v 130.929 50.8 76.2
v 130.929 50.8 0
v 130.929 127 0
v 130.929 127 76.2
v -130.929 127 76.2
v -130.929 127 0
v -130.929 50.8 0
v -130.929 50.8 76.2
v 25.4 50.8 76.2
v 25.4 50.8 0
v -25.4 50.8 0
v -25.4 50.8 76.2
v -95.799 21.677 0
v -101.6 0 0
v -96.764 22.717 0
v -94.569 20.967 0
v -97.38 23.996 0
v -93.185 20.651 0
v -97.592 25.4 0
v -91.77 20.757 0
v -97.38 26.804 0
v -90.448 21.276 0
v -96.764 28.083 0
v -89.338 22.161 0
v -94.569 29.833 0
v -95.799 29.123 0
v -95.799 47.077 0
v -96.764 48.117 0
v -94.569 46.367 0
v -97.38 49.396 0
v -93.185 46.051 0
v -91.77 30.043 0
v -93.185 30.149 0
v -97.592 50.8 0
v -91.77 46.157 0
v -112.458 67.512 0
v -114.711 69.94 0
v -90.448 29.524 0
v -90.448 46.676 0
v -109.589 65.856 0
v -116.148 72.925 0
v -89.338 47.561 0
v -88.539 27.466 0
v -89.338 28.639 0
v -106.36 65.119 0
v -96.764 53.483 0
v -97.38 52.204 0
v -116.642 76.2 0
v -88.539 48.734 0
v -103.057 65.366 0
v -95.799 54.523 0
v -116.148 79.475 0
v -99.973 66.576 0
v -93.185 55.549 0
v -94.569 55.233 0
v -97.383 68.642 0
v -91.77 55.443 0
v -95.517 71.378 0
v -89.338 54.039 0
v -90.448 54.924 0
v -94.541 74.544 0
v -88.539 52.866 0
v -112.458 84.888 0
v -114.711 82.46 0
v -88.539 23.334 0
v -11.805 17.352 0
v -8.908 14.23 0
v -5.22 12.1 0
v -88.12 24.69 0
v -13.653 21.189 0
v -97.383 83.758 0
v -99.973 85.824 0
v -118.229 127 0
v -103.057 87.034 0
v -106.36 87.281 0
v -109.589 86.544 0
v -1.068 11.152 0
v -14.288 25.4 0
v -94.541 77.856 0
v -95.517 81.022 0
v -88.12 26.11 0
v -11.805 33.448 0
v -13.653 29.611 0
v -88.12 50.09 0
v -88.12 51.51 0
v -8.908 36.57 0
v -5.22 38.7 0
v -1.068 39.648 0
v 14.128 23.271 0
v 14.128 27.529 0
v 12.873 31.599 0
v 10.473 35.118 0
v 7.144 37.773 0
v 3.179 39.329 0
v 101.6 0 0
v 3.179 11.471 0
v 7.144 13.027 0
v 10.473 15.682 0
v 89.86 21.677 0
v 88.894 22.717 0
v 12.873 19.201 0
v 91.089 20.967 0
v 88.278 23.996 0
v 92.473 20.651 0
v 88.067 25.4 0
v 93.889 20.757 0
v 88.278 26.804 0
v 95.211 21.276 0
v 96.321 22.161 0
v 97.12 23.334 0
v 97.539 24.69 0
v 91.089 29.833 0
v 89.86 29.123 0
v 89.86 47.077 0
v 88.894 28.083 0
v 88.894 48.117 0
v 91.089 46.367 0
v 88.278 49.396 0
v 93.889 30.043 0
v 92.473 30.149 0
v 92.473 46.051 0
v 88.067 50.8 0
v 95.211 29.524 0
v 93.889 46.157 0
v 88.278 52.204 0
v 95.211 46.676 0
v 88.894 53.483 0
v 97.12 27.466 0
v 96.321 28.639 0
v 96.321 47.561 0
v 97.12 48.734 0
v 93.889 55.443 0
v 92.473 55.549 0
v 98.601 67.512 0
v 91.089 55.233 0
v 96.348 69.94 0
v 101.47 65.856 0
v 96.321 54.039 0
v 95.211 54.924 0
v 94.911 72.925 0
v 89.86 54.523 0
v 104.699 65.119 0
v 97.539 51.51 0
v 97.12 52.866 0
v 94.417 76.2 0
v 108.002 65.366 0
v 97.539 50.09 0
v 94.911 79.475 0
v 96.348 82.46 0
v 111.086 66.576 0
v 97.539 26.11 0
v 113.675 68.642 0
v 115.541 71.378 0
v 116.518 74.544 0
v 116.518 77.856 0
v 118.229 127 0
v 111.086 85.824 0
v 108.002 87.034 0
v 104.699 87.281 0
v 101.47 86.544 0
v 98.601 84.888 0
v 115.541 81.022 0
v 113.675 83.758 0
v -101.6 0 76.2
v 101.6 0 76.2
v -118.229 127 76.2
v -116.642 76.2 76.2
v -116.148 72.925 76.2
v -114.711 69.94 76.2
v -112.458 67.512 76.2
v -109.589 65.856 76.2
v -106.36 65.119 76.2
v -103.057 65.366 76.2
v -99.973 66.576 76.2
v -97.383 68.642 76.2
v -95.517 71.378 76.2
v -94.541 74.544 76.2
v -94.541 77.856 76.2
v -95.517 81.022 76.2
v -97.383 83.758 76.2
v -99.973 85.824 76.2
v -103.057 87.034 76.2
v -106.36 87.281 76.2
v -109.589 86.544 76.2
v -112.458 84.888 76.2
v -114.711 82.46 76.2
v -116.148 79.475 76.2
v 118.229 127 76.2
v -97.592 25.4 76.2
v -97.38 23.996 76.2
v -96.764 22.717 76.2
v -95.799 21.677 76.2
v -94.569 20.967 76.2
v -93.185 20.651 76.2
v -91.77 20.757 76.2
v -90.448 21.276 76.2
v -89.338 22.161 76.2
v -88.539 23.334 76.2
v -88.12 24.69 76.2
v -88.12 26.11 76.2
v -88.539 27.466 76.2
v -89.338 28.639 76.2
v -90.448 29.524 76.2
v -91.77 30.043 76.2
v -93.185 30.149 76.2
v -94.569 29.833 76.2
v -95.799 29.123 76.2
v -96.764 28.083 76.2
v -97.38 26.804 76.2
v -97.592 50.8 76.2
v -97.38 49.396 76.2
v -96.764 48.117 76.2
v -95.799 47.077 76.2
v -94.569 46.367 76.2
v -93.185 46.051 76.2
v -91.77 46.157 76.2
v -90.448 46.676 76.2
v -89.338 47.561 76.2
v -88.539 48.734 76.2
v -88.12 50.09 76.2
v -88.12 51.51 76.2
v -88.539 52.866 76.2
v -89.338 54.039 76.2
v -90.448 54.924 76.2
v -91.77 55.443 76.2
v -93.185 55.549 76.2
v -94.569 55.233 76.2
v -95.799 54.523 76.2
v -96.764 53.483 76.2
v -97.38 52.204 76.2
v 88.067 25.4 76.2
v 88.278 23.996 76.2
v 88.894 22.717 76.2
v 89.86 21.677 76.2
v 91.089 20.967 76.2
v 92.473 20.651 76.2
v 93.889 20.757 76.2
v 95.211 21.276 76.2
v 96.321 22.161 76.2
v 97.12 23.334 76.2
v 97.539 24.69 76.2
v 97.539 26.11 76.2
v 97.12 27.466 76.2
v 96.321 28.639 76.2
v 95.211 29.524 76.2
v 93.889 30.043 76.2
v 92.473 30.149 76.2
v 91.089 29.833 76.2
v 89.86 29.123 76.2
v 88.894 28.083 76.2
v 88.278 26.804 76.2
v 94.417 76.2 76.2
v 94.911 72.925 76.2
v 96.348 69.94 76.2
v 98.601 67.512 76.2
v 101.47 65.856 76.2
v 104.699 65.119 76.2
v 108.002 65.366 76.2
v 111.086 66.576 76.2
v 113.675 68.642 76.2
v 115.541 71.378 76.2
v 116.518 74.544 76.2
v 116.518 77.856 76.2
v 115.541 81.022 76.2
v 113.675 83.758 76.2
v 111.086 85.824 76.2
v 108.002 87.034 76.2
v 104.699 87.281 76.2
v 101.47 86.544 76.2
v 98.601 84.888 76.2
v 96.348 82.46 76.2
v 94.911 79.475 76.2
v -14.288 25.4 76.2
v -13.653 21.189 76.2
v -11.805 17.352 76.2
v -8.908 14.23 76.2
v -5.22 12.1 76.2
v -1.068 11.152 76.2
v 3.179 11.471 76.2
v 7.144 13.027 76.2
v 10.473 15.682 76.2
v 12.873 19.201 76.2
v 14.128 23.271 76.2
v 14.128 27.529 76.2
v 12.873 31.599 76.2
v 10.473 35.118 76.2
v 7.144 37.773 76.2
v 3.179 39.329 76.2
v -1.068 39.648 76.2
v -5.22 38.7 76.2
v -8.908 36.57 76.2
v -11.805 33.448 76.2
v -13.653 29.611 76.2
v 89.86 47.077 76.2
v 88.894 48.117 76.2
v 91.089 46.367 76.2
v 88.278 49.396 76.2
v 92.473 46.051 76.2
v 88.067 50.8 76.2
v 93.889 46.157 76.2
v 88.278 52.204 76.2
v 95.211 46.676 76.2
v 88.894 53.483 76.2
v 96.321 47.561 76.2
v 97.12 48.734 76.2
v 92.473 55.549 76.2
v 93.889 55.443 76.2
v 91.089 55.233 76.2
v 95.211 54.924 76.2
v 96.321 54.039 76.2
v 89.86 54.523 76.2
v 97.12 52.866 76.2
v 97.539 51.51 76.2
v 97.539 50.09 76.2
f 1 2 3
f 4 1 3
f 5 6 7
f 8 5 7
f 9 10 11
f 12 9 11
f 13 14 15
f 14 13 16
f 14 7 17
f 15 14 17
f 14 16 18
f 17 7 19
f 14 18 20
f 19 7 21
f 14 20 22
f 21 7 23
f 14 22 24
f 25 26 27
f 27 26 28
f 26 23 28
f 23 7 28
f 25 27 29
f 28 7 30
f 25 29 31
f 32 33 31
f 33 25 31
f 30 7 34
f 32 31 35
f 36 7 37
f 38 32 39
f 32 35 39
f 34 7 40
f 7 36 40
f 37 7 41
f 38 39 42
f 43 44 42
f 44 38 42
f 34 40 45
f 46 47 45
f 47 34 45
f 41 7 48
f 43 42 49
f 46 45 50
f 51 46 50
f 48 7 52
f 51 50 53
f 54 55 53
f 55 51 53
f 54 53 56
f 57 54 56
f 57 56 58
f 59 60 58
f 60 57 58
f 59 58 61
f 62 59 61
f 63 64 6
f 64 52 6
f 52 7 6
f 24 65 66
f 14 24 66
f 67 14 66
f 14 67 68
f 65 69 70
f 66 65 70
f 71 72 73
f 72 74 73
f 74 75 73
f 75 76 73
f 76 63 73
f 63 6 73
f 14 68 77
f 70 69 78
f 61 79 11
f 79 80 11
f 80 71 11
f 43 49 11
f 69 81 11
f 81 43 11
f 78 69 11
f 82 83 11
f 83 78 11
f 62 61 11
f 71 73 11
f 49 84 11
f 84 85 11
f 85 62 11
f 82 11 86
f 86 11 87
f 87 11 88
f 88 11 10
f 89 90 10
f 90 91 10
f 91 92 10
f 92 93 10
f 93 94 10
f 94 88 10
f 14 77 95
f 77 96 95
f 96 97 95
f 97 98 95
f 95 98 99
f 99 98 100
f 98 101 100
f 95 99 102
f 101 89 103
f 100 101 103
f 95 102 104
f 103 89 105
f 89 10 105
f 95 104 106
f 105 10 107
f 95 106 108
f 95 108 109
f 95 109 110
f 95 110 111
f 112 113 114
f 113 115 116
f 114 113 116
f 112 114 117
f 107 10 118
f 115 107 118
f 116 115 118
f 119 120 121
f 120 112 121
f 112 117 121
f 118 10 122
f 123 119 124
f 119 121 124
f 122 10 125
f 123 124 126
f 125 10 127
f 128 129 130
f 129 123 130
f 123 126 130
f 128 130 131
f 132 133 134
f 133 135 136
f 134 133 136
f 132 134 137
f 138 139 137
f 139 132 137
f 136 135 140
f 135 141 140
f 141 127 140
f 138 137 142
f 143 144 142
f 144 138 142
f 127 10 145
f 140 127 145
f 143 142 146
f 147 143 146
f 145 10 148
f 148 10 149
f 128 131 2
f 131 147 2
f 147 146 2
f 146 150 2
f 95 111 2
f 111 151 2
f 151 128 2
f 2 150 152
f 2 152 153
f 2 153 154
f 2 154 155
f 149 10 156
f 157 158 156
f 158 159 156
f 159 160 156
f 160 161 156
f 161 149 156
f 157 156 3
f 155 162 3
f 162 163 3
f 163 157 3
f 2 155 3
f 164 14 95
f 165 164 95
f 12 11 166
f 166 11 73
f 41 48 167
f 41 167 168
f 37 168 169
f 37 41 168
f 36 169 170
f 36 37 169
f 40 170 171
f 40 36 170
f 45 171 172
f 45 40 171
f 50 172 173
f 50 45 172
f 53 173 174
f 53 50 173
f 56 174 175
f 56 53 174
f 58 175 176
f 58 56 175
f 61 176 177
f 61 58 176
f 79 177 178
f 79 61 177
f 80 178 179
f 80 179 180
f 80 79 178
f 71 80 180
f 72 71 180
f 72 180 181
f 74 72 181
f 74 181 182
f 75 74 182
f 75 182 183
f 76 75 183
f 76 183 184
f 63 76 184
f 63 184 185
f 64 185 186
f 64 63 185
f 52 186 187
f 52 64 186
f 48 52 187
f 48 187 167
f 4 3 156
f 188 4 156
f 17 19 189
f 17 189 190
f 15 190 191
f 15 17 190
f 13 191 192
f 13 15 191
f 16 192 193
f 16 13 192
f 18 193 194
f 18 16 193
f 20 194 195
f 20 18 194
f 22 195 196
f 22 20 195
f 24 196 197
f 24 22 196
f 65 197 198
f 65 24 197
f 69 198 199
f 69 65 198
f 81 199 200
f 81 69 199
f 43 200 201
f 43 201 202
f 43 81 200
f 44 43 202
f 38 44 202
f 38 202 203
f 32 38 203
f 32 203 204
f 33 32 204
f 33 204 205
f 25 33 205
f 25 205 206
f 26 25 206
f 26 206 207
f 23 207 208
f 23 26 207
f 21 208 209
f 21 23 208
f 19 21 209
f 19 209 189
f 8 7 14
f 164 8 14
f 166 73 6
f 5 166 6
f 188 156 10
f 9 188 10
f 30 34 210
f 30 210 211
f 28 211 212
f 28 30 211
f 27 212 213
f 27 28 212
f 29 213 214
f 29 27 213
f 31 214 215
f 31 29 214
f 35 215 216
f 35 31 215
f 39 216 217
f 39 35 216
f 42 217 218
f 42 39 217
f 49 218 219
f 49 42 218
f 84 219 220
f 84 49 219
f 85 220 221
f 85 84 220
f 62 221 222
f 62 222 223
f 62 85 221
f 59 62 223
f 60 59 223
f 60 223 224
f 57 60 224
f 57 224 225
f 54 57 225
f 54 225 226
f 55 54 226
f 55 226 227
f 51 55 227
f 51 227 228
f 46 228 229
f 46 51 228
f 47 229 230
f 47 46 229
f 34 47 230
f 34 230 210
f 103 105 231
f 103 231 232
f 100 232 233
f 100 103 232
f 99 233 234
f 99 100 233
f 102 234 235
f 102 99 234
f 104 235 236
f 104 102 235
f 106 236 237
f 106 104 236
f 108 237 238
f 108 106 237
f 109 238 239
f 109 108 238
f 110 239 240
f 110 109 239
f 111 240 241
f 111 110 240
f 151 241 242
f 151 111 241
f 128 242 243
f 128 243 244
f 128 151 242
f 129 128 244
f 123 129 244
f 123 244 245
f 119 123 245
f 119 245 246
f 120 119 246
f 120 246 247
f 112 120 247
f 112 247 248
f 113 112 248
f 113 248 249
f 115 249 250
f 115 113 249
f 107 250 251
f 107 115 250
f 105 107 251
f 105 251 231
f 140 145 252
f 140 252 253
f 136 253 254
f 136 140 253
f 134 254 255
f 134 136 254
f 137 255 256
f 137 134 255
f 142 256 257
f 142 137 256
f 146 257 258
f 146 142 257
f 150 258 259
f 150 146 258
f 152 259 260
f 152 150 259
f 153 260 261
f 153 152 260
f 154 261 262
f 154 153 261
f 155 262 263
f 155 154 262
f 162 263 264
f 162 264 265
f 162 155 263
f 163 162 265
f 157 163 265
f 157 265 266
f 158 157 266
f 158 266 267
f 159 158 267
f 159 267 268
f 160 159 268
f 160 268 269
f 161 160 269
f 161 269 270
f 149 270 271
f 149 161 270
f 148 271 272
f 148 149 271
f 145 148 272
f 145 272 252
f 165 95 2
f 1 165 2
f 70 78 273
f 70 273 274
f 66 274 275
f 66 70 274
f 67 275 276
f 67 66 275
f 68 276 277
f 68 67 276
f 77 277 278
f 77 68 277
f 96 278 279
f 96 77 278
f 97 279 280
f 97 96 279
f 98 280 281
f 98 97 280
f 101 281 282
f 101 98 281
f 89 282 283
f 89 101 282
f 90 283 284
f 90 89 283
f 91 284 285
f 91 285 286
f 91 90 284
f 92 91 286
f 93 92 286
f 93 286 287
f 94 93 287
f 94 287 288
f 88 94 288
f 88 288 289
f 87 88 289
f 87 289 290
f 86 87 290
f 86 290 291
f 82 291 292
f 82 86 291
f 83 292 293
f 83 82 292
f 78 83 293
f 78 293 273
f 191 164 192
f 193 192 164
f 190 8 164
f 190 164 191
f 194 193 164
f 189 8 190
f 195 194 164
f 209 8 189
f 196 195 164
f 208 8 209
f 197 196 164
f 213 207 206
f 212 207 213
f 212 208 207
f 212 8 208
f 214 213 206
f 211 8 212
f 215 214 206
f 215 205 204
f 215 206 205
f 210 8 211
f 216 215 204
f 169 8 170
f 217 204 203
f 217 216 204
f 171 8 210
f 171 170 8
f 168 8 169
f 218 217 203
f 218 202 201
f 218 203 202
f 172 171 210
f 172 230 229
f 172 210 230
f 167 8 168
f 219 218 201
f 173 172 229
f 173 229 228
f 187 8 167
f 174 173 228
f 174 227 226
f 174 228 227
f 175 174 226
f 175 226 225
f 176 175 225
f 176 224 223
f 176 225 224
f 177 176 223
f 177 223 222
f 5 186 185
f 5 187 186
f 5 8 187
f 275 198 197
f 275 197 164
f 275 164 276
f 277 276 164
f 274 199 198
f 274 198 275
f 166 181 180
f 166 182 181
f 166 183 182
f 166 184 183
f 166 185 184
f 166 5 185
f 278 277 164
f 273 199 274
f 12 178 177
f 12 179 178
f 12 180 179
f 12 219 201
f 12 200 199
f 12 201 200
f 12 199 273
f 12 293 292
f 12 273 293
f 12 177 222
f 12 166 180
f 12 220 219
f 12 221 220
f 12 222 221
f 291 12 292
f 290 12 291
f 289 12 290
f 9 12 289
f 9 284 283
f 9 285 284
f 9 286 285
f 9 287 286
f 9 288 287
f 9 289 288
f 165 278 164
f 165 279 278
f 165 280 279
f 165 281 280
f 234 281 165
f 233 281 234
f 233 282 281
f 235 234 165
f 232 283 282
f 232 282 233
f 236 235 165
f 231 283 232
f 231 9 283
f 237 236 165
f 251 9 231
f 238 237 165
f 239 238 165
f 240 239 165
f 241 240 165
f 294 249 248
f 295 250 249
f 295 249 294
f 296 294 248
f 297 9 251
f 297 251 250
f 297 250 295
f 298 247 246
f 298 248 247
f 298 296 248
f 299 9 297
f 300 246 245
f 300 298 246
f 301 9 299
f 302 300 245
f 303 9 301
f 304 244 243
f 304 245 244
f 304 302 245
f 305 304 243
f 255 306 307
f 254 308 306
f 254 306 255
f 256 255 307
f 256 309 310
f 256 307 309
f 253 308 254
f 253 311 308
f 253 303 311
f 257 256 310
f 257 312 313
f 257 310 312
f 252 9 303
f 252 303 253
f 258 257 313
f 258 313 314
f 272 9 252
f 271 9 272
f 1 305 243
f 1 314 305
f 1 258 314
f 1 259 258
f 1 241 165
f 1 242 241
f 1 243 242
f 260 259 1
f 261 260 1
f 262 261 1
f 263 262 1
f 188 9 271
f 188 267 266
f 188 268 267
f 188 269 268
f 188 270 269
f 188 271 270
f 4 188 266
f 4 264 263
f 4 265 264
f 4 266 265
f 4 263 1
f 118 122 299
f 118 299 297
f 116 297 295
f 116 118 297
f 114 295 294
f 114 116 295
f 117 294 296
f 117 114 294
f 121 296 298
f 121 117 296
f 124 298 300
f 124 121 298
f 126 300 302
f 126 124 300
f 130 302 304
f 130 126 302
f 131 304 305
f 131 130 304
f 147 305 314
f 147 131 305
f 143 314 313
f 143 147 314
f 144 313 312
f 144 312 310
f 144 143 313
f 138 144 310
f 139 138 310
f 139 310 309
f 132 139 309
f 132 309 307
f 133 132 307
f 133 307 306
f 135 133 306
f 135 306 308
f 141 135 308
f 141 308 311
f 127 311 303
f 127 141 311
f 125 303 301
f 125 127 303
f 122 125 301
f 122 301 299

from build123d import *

# Parameters (mm, degrees)
SKETCH1_R           = 11.1125
SKETCH1_R_2         = 4.7625
SKETCH1_R_3         = 14.2875
BOSS_EXTRUDE1_DEPTH = 76.2


with BuildPart() as part:
    # Sketch1 → Boss-Extrude1 (new body)
    with BuildSketch(Plane.XY):
        Polygon((-101.6, 0), (101.6, 0), (130.929393675, 50.8), (130.929393675, 127), (118.229393675, 127), (25.4, 50.8), (-25.4, 50.8), (-118.229393675, 127), (-130.929393675, 127), (-130.929393675, 50.8), align=None)
        with Locations(Location((105.529393675, 76.2, 0), (0, 0, 180))):
            Circle(SKETCH1_R, mode=Mode.SUBTRACT)
        with Locations(Location((92.829393675, 50.8, 0), (0, 0, 180))):
            Circle(SKETCH1_R_2, mode=Mode.SUBTRACT)
        with Locations(Location((92.829393675, 25.4, 0), (0, 0, 180))):
            Circle(SKETCH1_R_2, mode=Mode.SUBTRACT)
        with Locations(Location((0, 25.4, 0), (0, 0, 180))):
            Circle(SKETCH1_R_3, mode=Mode.SUBTRACT)
        with Locations(Location((-92.829393675, 25.4, 0), (0, 0, 180))):
            Circle(SKETCH1_R_2, mode=Mode.SUBTRACT)
        with Locations(Location((-92.829393675, 50.8, 0), (0, 0, 180))):
            Circle(SKETCH1_R_2, mode=Mode.SUBTRACT)
        with Locations(Location((-105.529393675, 76.2, 0), (0, 0, 180))):
            Circle(SKETCH1_R, mode=Mode.SUBTRACT)
    extrude(amount=BOSS_EXTRUDE1_DEPTH)


solid = part.part
